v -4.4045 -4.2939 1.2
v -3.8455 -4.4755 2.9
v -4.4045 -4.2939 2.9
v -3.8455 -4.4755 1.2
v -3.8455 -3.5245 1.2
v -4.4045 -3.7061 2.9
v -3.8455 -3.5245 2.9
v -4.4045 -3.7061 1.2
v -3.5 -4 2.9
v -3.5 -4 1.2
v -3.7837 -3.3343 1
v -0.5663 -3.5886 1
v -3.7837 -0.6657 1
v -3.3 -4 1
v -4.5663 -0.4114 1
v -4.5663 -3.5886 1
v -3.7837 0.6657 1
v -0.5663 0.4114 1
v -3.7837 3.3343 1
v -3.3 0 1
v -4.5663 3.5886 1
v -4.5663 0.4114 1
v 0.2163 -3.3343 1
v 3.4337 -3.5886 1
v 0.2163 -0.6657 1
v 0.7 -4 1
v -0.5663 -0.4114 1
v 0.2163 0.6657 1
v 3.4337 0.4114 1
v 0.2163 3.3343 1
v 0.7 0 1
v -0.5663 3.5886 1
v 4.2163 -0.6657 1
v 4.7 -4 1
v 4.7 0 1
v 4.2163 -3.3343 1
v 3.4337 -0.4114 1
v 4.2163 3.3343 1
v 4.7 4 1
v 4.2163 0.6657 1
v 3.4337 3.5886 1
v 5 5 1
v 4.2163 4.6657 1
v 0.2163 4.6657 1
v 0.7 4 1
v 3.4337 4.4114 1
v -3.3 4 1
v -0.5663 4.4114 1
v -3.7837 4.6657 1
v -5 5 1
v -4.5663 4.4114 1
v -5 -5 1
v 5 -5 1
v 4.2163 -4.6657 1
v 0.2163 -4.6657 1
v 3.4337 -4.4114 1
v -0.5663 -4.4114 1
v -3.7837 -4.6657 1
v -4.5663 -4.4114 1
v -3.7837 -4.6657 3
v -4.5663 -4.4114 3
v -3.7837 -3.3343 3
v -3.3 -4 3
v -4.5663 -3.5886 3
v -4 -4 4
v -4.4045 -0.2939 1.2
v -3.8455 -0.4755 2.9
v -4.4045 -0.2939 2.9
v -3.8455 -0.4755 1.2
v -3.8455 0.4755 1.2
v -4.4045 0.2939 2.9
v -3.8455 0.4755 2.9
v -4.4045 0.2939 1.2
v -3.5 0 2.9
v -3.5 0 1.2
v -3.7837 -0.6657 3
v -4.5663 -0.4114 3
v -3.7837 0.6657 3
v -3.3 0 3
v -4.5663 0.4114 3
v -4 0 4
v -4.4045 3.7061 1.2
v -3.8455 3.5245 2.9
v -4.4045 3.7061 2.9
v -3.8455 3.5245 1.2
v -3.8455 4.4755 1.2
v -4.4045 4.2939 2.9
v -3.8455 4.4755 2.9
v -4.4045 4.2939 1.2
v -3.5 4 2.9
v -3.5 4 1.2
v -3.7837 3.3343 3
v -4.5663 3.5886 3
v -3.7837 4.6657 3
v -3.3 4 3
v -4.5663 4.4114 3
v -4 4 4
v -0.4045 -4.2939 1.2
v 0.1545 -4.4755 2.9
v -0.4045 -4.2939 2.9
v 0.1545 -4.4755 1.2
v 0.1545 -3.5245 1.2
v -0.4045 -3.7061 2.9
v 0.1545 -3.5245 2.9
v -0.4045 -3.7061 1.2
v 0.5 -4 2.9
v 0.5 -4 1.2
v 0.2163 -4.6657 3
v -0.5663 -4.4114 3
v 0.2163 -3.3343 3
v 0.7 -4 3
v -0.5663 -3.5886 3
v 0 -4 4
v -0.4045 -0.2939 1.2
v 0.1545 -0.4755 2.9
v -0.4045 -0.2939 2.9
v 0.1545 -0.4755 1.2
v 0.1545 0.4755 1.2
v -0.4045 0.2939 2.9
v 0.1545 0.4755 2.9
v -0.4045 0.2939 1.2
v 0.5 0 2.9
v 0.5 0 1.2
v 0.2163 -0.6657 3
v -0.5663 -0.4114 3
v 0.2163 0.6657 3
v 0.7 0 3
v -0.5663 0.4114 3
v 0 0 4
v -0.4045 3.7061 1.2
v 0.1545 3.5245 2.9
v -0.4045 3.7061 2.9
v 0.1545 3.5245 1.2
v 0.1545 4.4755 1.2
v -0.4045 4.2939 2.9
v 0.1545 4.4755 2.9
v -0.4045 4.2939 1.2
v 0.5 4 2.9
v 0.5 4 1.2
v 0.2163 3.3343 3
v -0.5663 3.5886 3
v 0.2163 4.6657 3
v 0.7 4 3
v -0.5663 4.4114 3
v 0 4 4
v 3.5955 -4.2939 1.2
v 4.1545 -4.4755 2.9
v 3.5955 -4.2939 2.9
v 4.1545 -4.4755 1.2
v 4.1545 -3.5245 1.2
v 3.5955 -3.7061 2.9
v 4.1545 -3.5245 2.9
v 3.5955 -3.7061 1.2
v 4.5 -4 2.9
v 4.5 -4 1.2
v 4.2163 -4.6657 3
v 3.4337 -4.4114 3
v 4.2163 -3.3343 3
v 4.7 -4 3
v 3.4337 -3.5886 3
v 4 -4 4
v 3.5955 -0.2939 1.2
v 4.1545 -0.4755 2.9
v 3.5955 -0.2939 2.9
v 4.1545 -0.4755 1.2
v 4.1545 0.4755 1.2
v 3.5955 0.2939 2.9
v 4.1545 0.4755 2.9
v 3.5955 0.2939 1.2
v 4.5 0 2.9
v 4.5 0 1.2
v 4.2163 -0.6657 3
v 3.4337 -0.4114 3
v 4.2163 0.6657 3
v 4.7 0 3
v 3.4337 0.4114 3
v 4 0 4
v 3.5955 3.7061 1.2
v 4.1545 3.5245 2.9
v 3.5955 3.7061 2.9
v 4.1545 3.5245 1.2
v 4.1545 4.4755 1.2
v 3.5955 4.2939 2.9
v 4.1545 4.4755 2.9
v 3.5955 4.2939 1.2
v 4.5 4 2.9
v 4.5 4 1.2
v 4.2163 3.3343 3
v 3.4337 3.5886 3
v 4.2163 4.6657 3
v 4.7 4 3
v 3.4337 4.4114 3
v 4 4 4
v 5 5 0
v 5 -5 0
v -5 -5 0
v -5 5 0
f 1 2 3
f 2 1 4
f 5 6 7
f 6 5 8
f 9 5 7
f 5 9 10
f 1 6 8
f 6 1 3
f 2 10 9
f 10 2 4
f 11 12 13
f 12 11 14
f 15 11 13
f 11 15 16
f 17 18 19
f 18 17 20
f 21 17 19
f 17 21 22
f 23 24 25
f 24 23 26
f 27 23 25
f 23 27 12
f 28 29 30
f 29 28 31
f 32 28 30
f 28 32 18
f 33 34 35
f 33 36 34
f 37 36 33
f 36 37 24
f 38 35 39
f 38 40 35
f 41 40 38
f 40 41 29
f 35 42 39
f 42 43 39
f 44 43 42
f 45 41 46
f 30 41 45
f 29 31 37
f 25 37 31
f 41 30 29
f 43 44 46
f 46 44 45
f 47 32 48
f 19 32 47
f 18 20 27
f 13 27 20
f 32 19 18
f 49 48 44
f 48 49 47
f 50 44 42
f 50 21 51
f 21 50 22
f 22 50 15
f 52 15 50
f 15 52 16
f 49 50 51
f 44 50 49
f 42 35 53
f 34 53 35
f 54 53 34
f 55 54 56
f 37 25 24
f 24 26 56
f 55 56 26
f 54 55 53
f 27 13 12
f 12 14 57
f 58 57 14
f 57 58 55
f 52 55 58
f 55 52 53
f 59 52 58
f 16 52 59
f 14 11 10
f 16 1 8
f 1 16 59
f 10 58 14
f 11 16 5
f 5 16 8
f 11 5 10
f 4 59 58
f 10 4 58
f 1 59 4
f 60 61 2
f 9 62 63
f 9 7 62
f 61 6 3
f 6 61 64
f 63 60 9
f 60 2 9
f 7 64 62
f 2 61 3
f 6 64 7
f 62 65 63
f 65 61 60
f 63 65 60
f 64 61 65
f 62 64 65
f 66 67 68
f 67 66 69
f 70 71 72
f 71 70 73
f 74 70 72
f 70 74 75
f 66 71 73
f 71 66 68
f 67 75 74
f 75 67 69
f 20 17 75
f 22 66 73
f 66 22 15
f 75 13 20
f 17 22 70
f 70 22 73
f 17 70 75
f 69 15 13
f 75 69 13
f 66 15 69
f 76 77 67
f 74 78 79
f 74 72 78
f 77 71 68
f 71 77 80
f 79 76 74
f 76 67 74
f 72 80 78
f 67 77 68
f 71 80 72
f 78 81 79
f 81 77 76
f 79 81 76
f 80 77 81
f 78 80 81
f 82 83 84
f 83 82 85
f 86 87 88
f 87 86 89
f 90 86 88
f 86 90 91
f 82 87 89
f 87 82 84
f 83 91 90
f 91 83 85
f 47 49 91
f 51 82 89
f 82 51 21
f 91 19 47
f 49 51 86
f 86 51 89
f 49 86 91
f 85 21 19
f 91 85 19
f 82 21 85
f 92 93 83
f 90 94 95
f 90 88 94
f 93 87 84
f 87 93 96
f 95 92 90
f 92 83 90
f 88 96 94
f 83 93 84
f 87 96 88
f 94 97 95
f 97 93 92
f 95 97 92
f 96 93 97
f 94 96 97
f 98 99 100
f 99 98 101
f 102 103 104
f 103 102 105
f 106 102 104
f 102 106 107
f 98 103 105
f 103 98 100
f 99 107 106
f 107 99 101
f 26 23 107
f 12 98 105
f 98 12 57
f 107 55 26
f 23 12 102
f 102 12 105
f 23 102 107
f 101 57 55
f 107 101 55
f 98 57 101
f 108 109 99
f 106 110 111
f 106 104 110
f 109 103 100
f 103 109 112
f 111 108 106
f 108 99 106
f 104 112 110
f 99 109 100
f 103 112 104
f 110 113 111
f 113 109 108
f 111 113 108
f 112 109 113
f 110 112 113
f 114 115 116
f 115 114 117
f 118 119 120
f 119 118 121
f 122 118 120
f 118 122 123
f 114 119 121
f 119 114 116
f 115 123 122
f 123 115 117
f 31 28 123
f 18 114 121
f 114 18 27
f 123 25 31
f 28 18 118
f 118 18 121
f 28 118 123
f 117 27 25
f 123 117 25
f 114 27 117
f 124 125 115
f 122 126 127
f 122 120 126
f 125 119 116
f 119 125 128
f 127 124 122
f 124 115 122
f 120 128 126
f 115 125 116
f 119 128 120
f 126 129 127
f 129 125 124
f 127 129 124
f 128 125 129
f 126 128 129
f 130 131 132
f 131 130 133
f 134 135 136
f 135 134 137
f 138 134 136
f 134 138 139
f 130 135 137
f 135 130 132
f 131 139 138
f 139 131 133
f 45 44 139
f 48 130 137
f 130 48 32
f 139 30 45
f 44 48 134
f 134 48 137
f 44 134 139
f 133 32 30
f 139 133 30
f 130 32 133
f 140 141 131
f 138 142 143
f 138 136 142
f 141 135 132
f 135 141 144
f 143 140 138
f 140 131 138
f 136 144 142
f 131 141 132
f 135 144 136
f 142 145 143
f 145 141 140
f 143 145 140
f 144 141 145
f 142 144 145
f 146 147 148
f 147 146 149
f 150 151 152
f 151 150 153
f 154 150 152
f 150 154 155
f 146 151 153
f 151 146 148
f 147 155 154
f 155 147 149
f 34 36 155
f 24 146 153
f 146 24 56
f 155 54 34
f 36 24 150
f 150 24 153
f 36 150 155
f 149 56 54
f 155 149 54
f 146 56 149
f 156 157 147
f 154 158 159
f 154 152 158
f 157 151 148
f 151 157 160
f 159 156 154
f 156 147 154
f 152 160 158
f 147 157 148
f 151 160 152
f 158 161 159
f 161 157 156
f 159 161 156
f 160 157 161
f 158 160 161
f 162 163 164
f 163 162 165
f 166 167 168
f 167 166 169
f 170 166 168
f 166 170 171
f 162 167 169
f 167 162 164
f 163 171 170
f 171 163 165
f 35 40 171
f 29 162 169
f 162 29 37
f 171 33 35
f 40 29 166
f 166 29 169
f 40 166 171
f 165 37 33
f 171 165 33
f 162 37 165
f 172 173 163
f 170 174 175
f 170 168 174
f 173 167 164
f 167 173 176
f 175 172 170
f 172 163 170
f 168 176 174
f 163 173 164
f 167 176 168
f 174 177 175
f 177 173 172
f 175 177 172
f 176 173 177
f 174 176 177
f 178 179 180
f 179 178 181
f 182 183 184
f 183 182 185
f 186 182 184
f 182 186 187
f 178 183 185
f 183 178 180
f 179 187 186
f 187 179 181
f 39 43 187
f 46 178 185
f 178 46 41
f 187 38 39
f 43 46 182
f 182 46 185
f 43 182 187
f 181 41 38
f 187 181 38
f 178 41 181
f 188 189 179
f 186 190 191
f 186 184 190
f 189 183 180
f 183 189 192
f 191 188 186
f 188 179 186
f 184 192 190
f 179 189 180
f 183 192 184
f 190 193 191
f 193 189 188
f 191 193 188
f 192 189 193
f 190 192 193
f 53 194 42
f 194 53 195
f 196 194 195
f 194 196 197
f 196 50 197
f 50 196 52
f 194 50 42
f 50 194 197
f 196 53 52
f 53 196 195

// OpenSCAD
module pin(height) {
    cylinder(r = 0.5, h = height - 1.1);
    cylinder(r1 = 0.7, r2 = 0.5, h = 0.2);
    translate([0,0,height - 1.1]) {
        cylinder(r1 = 0.5, r2 = 0.7, h = 0.1);
    }
    translate([0,0,height - 1]) {
        cylinder(r1 = 0.7, r2 = 0, h = 1);
    }
}

module pins(height, size) {
    for (x = [-size - 4:4:size + 4]) {
        for (y = [-size - 4:4:size + 4]) {
            translate([x,y,0]) {
                pin(height);
            }
        }
    }
}

pinHeight = 3;
translate([-5,-5,0]) {
    cube([10, 10, 1]);
}
translate([0,0,1]) {
    pins(pinHeight, 0);
}
